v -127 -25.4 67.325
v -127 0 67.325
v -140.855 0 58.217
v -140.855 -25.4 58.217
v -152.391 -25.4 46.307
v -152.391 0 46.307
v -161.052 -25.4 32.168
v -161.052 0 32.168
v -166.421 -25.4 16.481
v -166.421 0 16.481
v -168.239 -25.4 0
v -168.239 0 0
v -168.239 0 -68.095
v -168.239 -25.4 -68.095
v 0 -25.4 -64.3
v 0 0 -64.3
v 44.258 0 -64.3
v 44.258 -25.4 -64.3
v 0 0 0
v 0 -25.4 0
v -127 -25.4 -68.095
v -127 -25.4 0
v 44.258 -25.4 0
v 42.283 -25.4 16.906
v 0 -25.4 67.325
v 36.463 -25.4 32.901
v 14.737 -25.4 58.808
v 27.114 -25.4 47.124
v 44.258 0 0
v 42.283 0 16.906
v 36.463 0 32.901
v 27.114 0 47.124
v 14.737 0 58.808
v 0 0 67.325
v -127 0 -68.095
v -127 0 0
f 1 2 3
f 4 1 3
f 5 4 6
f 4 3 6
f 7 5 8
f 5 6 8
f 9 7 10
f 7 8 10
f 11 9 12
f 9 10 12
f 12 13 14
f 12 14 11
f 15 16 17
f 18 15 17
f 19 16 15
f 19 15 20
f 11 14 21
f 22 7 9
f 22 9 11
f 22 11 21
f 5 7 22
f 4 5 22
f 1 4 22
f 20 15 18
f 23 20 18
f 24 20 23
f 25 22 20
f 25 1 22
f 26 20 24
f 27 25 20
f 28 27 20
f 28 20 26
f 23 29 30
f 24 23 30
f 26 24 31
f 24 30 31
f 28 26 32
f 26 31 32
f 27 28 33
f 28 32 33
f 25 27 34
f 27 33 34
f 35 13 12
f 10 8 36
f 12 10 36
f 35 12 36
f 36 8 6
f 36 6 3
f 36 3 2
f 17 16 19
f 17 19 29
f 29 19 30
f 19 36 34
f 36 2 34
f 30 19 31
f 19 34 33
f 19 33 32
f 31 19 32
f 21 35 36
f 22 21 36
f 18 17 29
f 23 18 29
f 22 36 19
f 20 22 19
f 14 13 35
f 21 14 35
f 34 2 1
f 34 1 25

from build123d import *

# Parameters (mm, degrees)
F0_W     = 127
F0_H     = 67.3248254269
F0_W_2   = 44.2579090595
F0_H_2   = 64.2999485135
F0_W_3   = 41.2393848896
F0_H_3   = 68.0945366621
F1_DEPTH = 25.4


with BuildPart() as f1:
    # F0 (on Front) → F1 (new body)
    with BuildSketch(Plane.XZ):
        with Locations((-63.5, 33.6624127134)):
            Rectangle(F0_W, F0_H)
        with BuildLine():
            Line((0, 67.3248254269), (0, 0))
            Line((0, 0), (44.2579090595, 0))
            ThreePointArc((44.2579090595, 0), (32.2025736705, 40.2845957938), (0, 67.3248254269))
        make_face()
        with Locations((22.1289545298, -32.1499742568)):
            Rectangle(F0_W_2, F0_H_2)
        with BuildLine():
            Line((-168.2393848896, 0), (-127, 0))
            Line((-127, 0), (-127, 67.3248254269))
            ThreePointArc((-127, 67.3248254269), (-157.1100758974, 39.4756855065), (-168.2393848896, 0))
        make_face()
        with Locations((-147.6196924448, -34.0472683311)):
            Rectangle(F0_W_3, F0_H_3)
    extrude(amount=F1_DEPTH)


solid = f1.part
